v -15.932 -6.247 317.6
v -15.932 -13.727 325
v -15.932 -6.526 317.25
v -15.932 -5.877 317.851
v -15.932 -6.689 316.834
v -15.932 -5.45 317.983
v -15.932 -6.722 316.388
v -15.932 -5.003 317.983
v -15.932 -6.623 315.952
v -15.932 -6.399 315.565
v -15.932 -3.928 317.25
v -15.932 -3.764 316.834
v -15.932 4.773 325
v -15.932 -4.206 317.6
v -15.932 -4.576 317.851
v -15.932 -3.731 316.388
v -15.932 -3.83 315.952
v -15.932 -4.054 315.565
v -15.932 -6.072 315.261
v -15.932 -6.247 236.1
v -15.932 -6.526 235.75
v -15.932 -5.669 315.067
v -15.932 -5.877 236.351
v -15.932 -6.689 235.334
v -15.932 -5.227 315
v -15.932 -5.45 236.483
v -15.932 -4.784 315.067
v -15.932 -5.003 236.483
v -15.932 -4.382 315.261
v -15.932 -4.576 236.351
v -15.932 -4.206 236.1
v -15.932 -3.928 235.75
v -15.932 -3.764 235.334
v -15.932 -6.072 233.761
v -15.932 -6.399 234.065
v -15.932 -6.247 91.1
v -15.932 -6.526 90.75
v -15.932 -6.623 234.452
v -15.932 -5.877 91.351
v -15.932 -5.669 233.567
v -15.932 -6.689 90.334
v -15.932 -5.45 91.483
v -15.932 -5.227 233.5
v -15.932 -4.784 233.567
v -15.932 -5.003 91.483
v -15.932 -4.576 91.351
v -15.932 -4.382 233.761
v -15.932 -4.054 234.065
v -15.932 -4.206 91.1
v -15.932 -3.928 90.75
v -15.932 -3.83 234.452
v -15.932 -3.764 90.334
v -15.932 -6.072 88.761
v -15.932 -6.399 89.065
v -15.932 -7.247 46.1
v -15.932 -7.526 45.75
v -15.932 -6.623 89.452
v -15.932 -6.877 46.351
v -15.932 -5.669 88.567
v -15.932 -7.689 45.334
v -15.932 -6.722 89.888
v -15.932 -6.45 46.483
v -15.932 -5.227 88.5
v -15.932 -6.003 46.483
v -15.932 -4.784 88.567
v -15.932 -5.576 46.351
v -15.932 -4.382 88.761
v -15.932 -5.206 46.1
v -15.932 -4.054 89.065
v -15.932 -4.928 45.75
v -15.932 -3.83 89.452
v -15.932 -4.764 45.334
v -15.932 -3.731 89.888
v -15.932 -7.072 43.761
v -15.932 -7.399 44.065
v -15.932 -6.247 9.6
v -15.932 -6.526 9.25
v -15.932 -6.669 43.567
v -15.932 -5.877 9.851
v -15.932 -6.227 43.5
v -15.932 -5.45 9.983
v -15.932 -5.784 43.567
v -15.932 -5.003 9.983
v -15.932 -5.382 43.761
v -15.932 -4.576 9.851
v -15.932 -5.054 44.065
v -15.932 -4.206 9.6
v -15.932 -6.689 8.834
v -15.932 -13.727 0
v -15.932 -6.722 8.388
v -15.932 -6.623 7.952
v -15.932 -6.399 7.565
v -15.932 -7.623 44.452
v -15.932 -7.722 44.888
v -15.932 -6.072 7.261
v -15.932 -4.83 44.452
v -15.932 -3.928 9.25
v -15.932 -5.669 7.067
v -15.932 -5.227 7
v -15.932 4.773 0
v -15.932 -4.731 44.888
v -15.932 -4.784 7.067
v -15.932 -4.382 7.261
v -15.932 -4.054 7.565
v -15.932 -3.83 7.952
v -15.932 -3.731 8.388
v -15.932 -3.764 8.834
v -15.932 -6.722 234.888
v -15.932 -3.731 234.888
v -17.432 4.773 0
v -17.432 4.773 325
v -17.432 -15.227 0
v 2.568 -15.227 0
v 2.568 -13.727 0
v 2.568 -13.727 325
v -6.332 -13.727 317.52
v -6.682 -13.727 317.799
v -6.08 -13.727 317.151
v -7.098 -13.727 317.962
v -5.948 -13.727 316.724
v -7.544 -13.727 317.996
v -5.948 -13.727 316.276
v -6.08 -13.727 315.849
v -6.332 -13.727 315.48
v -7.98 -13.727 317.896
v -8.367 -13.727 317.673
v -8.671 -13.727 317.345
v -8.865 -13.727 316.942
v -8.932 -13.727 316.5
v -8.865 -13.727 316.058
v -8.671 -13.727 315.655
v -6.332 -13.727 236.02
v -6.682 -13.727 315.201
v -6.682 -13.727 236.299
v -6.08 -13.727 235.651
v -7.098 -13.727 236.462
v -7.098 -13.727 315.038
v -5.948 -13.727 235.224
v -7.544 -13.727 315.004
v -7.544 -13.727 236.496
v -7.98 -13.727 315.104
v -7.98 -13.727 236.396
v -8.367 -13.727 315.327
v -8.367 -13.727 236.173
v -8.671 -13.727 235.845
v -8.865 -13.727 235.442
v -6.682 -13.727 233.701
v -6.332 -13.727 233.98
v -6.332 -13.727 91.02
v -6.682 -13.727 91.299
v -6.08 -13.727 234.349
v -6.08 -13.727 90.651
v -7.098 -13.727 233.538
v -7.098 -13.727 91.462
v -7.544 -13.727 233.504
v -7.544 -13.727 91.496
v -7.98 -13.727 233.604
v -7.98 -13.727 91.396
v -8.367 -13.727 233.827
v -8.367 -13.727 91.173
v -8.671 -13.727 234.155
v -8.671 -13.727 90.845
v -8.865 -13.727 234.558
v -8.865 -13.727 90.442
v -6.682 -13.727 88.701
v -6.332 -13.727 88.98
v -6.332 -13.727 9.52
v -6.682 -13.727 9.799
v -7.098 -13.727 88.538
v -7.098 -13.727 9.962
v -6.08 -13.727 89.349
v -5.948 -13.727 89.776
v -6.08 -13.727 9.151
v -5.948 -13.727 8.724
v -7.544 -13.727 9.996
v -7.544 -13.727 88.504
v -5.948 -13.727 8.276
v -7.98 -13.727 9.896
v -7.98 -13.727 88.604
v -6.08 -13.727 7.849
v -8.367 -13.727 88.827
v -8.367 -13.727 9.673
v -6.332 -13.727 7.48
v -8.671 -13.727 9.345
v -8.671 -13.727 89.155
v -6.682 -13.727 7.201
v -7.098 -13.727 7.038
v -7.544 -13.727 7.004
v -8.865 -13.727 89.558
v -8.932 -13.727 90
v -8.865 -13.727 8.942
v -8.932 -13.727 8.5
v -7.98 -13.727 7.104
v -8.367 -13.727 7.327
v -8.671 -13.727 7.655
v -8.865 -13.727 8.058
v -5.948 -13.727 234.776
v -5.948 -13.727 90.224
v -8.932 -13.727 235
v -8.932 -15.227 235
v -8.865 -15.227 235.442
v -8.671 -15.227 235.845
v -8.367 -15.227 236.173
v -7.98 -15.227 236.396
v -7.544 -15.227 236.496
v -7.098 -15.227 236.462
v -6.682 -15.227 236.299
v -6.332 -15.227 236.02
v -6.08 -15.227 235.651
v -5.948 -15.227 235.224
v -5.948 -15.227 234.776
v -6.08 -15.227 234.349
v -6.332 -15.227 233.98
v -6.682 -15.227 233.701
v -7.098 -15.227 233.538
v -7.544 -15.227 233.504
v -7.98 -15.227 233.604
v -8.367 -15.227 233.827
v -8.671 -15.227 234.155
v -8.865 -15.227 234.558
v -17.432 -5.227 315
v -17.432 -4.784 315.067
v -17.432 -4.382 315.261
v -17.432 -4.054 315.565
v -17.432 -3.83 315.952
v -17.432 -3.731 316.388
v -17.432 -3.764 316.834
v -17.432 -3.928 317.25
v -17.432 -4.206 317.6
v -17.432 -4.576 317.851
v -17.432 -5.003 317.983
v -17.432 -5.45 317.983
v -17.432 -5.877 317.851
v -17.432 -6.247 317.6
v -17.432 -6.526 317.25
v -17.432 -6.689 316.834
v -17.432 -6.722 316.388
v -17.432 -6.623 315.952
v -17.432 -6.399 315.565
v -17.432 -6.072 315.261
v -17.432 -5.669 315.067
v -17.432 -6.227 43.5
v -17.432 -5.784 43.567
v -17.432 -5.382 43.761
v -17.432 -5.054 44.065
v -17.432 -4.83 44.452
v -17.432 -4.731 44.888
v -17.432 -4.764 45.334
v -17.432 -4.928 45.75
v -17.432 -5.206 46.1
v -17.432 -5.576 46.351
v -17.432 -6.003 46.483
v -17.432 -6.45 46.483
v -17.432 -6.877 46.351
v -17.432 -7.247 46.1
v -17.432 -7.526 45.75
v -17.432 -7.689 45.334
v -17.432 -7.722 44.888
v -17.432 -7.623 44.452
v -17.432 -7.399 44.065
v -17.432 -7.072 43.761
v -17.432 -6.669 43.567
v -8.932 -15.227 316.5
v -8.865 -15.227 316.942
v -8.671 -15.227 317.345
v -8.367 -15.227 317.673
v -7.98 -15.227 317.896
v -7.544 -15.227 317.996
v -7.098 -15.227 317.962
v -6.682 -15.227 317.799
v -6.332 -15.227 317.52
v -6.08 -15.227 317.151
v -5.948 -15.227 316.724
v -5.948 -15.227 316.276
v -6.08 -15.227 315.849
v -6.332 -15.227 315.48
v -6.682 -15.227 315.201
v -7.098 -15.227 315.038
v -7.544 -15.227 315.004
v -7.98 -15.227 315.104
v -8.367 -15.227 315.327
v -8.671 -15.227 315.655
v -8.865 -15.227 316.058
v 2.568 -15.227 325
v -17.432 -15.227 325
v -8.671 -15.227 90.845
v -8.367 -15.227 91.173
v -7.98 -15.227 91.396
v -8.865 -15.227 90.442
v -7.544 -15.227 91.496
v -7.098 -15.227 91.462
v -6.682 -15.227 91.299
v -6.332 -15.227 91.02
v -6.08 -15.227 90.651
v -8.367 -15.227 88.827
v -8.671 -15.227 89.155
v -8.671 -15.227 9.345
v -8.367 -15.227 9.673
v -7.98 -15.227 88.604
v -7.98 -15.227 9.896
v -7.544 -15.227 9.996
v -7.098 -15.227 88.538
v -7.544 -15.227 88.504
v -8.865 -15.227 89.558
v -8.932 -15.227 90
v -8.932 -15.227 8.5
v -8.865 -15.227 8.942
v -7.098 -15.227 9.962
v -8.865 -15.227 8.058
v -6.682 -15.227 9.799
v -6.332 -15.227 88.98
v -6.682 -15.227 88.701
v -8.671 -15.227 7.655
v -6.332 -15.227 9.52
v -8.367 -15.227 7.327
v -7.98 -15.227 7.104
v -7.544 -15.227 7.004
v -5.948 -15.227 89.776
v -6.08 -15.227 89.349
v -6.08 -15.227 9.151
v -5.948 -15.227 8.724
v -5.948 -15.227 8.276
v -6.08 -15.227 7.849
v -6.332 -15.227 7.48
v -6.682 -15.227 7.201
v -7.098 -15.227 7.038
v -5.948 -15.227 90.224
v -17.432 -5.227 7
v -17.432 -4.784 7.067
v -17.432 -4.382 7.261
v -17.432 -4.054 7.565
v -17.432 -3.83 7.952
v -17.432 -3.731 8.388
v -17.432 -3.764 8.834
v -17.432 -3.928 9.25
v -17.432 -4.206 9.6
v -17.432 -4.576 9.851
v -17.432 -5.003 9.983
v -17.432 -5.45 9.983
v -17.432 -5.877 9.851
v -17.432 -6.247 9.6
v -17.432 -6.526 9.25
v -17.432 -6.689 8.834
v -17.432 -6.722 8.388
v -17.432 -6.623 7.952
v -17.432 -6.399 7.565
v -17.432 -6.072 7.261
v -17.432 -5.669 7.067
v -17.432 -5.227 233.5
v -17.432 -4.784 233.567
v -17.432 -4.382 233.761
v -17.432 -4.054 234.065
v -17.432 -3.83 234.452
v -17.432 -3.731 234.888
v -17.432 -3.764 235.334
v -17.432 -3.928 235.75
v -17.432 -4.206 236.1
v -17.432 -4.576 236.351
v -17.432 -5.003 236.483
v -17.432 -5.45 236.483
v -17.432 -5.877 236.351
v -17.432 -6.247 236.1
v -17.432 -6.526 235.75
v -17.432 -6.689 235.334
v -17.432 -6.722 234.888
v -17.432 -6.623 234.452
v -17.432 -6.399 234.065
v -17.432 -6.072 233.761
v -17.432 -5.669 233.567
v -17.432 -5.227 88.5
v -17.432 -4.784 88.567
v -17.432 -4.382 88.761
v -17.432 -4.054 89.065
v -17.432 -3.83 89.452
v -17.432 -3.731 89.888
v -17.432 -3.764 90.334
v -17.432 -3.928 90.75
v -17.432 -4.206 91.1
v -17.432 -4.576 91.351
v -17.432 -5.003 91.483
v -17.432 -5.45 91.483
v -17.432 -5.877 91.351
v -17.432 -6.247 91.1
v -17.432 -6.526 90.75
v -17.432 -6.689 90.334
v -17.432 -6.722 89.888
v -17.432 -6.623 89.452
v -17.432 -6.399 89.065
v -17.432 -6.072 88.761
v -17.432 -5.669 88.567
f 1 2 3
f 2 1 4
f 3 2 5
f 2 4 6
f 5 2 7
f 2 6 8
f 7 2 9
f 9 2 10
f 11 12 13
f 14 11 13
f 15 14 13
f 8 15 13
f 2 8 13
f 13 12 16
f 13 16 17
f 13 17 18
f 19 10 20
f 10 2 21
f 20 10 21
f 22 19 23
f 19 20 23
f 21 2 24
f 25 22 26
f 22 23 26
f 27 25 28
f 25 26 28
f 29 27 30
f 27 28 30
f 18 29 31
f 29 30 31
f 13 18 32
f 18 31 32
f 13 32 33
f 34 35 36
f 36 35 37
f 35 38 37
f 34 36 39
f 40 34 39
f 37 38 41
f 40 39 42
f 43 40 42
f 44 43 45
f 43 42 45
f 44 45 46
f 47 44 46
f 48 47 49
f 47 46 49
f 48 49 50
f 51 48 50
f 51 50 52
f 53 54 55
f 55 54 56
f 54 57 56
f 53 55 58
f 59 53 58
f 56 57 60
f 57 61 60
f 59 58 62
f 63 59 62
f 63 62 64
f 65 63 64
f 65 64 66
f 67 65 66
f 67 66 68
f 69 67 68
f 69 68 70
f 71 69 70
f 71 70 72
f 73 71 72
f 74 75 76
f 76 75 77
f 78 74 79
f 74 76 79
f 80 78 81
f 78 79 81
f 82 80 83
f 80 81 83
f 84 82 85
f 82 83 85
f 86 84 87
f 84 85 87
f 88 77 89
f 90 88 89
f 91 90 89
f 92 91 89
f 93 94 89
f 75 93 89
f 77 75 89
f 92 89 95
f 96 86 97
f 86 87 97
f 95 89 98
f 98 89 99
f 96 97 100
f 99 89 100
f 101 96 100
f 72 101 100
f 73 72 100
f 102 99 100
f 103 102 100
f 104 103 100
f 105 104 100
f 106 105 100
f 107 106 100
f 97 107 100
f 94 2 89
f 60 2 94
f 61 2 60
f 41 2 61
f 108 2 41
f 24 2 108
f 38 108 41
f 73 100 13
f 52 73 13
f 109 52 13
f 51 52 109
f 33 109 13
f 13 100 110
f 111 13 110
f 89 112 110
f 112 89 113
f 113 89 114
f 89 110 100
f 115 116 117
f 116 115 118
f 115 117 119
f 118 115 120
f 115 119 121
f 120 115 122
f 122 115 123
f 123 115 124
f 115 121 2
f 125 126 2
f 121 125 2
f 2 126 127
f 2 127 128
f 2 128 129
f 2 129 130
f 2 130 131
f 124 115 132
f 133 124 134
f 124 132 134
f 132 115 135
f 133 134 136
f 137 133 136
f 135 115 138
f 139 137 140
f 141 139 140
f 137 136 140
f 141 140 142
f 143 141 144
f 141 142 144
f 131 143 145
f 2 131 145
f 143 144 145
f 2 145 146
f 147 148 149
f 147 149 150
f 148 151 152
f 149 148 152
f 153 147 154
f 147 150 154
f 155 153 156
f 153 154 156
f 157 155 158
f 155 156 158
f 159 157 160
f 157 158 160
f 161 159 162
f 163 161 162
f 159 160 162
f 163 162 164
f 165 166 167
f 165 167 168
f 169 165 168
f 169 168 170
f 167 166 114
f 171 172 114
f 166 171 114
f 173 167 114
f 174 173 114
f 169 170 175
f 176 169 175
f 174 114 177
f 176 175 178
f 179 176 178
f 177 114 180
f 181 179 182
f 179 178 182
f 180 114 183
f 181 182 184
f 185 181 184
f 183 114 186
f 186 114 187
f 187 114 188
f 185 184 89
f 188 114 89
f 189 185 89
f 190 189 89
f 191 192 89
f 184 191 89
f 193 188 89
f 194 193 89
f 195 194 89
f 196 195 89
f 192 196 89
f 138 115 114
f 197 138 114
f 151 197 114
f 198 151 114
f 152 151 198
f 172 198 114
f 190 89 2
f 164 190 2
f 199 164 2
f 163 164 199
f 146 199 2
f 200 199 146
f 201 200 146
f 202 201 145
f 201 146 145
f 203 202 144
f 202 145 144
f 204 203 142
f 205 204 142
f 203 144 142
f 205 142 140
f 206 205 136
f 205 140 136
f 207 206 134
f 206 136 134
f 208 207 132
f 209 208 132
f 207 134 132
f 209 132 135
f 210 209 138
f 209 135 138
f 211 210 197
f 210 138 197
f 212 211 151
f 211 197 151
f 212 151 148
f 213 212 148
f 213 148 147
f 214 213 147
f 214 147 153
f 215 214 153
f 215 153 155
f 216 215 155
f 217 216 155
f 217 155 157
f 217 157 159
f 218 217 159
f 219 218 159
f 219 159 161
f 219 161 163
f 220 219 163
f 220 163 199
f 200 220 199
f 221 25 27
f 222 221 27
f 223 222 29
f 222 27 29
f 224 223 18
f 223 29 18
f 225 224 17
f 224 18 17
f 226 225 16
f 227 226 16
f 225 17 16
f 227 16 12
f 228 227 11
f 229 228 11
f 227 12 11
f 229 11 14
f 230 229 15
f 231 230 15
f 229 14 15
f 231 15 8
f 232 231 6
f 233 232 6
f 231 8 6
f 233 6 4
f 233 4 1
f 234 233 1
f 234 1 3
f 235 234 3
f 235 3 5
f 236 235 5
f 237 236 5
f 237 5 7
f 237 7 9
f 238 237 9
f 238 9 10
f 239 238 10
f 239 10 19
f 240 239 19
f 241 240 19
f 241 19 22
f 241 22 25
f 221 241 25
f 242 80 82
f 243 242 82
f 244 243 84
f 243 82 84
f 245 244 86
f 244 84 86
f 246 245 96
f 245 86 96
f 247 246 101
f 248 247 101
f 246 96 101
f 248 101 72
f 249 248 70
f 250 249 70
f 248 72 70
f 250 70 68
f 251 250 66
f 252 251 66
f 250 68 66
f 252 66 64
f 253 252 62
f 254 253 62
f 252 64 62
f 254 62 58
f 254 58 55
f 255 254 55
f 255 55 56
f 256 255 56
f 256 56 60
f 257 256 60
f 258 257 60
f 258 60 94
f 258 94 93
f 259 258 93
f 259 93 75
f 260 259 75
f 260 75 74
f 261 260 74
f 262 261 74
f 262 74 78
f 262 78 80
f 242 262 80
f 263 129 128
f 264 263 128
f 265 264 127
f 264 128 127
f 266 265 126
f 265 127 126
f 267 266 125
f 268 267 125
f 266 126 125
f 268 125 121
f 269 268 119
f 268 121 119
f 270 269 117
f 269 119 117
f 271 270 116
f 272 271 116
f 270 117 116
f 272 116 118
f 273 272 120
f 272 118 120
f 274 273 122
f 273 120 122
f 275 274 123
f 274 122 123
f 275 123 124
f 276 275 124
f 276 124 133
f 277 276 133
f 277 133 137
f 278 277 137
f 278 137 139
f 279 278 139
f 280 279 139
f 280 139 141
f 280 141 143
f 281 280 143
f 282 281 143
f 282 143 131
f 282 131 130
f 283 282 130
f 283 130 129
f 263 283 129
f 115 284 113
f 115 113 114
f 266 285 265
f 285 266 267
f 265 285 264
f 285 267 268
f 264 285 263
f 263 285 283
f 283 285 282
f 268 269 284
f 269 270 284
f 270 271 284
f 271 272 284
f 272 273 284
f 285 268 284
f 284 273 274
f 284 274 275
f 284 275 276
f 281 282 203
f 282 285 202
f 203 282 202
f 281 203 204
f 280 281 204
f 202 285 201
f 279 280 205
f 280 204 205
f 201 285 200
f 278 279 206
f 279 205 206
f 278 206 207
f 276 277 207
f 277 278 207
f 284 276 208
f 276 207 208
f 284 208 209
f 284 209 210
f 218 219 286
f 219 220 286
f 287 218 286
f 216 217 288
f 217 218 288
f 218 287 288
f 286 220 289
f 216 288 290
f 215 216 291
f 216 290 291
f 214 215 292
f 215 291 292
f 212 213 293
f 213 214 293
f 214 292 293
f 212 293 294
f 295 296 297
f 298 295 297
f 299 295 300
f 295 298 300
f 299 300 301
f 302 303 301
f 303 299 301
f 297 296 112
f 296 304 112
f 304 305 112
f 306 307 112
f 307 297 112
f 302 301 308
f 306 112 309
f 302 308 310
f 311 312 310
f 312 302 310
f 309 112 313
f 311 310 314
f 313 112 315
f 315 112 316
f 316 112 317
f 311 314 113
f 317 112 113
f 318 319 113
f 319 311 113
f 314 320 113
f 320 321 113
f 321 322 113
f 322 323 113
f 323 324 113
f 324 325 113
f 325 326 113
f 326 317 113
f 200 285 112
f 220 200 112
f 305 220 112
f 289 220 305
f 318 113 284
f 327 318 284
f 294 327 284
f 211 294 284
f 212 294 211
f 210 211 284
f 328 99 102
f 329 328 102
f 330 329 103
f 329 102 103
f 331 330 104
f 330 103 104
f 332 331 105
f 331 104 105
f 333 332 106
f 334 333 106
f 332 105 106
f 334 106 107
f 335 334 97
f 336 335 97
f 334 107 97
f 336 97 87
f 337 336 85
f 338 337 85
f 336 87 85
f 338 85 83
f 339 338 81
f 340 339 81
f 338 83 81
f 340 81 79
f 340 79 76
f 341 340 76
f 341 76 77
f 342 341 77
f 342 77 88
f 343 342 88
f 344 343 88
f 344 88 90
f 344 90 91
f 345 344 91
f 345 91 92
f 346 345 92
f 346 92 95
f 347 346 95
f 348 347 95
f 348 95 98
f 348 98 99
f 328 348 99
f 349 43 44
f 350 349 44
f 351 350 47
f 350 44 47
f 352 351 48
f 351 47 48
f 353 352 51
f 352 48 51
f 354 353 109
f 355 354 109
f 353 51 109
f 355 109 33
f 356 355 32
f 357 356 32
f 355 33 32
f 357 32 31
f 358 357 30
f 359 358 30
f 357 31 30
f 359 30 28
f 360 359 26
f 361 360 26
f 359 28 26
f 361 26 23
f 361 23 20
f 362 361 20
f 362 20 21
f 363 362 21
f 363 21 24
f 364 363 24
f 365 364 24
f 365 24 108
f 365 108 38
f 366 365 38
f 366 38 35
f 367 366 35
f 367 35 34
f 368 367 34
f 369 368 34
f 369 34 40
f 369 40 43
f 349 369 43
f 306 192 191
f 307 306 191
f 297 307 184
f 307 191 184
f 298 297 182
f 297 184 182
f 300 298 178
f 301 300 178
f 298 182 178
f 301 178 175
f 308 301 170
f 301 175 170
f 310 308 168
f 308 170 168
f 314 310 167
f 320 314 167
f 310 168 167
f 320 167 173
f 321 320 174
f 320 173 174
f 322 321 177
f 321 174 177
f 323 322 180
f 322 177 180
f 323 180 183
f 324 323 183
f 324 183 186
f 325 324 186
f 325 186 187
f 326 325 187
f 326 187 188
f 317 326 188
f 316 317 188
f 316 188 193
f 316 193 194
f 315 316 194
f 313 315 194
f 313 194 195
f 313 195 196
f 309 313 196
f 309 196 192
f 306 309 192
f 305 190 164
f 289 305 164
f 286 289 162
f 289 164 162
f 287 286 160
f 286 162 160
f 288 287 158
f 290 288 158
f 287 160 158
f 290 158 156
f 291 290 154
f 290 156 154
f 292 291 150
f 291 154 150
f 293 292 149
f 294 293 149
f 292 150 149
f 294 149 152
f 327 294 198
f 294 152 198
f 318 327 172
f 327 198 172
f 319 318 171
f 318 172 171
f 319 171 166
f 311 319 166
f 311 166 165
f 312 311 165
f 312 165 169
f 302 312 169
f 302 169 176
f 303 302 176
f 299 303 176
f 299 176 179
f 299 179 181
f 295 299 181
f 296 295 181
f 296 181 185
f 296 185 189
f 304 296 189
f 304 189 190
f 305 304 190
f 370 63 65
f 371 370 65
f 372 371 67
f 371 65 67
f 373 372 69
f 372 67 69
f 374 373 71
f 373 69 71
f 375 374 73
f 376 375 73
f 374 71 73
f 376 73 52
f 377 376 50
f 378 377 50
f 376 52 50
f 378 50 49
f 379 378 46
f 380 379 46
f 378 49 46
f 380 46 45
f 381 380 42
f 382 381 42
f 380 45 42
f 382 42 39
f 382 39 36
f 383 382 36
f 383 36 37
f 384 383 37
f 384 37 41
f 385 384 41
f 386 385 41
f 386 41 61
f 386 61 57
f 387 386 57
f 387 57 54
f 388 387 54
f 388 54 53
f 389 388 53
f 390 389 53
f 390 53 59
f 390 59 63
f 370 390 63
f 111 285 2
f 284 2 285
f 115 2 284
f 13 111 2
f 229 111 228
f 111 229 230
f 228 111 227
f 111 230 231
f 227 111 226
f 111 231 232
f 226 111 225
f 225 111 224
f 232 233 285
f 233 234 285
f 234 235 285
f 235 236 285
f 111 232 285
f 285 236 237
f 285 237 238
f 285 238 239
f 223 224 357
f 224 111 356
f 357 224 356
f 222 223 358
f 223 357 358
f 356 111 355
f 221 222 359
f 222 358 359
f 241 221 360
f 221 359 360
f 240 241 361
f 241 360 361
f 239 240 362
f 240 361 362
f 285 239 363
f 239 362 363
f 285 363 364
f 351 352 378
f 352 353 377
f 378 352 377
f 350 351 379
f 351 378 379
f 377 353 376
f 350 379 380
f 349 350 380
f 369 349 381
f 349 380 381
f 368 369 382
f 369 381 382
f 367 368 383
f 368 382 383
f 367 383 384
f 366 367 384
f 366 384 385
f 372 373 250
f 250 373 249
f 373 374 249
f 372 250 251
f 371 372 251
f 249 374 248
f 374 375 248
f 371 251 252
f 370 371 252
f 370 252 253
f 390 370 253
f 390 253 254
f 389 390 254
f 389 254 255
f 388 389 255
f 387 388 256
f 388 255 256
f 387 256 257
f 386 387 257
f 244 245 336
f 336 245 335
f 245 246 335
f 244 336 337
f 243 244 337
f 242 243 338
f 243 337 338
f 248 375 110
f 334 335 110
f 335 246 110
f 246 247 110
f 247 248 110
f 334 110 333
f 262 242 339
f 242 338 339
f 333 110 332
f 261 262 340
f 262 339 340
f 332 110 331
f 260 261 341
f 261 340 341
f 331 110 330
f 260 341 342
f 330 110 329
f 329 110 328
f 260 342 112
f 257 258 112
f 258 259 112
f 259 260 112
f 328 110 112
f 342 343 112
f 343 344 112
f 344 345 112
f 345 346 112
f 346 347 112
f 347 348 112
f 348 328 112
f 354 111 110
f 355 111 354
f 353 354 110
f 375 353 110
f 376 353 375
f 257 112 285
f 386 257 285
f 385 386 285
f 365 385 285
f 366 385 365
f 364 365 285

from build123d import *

# Parameters (mm, degrees)
EXTRUSION1_DEPTH = 325
ESQUISSE2_R      = 1.5
EXTRUSION2_DEPTH = 300
ESQUISSE3_R      = 1.5
EXTRUSION3_DEPTH = 300


with BuildPart() as part:
    # Esquisse1 → Extrusion1 (new body)
    with BuildSketch(Plane.XY):
        Polygon((-17.43168638, 4.773368421), (-17.43168638, -15.226631579), (2.56831362, -15.226631579), (2.56831362, -13.726631579), (-15.93168638, -13.726631579), (-15.93168638, 4.773368421), align=None)
    extrude(amount=EXTRUSION1_DEPTH)

    # Esquisse2 → Extrusion2 (cut)
    with BuildSketch(Plane(origin=(0, -13.726631579, 0), x_dir=(-1, 0, 0), z_dir=(0, 1, 0))):
        with Locations((7.43168638, 8.5)):
            Circle(ESQUISSE2_R)
        with Locations((7.43168638, 316.5)):
            Circle(ESQUISSE2_R)
        with Locations((7.43168638, 235)):
            Circle(ESQUISSE2_R)
        with Locations((7.43168638, 90)):
            Circle(ESQUISSE2_R)
    extrude(amount=-EXTRUSION2_DEPTH, mode=Mode.SUBTRACT)

    # Esquisse3 → Extrusion3 (cut)
    with BuildSketch(Plane(origin=(-15.93168638, 0, 0), x_dir=(0, 0, -1), z_dir=(1, 0, 0))):
        with Locations((-316.5, -5.226631579)):
            Circle(ESQUISSE3_R)
        with Locations((-8.5, -5.226631579)):
            Circle(ESQUISSE3_R)
        with Locations((-235, -5.226631579)):
            Circle(ESQUISSE3_R)
        with Locations((-90, -5.226631579)):
            Circle(ESQUISSE3_R)
        with Locations((-45, -6.226631579)):
            Circle(ESQUISSE3_R)
    extrude(amount=-EXTRUSION3_DEPTH, mode=Mode.SUBTRACT)


solid = part.part
